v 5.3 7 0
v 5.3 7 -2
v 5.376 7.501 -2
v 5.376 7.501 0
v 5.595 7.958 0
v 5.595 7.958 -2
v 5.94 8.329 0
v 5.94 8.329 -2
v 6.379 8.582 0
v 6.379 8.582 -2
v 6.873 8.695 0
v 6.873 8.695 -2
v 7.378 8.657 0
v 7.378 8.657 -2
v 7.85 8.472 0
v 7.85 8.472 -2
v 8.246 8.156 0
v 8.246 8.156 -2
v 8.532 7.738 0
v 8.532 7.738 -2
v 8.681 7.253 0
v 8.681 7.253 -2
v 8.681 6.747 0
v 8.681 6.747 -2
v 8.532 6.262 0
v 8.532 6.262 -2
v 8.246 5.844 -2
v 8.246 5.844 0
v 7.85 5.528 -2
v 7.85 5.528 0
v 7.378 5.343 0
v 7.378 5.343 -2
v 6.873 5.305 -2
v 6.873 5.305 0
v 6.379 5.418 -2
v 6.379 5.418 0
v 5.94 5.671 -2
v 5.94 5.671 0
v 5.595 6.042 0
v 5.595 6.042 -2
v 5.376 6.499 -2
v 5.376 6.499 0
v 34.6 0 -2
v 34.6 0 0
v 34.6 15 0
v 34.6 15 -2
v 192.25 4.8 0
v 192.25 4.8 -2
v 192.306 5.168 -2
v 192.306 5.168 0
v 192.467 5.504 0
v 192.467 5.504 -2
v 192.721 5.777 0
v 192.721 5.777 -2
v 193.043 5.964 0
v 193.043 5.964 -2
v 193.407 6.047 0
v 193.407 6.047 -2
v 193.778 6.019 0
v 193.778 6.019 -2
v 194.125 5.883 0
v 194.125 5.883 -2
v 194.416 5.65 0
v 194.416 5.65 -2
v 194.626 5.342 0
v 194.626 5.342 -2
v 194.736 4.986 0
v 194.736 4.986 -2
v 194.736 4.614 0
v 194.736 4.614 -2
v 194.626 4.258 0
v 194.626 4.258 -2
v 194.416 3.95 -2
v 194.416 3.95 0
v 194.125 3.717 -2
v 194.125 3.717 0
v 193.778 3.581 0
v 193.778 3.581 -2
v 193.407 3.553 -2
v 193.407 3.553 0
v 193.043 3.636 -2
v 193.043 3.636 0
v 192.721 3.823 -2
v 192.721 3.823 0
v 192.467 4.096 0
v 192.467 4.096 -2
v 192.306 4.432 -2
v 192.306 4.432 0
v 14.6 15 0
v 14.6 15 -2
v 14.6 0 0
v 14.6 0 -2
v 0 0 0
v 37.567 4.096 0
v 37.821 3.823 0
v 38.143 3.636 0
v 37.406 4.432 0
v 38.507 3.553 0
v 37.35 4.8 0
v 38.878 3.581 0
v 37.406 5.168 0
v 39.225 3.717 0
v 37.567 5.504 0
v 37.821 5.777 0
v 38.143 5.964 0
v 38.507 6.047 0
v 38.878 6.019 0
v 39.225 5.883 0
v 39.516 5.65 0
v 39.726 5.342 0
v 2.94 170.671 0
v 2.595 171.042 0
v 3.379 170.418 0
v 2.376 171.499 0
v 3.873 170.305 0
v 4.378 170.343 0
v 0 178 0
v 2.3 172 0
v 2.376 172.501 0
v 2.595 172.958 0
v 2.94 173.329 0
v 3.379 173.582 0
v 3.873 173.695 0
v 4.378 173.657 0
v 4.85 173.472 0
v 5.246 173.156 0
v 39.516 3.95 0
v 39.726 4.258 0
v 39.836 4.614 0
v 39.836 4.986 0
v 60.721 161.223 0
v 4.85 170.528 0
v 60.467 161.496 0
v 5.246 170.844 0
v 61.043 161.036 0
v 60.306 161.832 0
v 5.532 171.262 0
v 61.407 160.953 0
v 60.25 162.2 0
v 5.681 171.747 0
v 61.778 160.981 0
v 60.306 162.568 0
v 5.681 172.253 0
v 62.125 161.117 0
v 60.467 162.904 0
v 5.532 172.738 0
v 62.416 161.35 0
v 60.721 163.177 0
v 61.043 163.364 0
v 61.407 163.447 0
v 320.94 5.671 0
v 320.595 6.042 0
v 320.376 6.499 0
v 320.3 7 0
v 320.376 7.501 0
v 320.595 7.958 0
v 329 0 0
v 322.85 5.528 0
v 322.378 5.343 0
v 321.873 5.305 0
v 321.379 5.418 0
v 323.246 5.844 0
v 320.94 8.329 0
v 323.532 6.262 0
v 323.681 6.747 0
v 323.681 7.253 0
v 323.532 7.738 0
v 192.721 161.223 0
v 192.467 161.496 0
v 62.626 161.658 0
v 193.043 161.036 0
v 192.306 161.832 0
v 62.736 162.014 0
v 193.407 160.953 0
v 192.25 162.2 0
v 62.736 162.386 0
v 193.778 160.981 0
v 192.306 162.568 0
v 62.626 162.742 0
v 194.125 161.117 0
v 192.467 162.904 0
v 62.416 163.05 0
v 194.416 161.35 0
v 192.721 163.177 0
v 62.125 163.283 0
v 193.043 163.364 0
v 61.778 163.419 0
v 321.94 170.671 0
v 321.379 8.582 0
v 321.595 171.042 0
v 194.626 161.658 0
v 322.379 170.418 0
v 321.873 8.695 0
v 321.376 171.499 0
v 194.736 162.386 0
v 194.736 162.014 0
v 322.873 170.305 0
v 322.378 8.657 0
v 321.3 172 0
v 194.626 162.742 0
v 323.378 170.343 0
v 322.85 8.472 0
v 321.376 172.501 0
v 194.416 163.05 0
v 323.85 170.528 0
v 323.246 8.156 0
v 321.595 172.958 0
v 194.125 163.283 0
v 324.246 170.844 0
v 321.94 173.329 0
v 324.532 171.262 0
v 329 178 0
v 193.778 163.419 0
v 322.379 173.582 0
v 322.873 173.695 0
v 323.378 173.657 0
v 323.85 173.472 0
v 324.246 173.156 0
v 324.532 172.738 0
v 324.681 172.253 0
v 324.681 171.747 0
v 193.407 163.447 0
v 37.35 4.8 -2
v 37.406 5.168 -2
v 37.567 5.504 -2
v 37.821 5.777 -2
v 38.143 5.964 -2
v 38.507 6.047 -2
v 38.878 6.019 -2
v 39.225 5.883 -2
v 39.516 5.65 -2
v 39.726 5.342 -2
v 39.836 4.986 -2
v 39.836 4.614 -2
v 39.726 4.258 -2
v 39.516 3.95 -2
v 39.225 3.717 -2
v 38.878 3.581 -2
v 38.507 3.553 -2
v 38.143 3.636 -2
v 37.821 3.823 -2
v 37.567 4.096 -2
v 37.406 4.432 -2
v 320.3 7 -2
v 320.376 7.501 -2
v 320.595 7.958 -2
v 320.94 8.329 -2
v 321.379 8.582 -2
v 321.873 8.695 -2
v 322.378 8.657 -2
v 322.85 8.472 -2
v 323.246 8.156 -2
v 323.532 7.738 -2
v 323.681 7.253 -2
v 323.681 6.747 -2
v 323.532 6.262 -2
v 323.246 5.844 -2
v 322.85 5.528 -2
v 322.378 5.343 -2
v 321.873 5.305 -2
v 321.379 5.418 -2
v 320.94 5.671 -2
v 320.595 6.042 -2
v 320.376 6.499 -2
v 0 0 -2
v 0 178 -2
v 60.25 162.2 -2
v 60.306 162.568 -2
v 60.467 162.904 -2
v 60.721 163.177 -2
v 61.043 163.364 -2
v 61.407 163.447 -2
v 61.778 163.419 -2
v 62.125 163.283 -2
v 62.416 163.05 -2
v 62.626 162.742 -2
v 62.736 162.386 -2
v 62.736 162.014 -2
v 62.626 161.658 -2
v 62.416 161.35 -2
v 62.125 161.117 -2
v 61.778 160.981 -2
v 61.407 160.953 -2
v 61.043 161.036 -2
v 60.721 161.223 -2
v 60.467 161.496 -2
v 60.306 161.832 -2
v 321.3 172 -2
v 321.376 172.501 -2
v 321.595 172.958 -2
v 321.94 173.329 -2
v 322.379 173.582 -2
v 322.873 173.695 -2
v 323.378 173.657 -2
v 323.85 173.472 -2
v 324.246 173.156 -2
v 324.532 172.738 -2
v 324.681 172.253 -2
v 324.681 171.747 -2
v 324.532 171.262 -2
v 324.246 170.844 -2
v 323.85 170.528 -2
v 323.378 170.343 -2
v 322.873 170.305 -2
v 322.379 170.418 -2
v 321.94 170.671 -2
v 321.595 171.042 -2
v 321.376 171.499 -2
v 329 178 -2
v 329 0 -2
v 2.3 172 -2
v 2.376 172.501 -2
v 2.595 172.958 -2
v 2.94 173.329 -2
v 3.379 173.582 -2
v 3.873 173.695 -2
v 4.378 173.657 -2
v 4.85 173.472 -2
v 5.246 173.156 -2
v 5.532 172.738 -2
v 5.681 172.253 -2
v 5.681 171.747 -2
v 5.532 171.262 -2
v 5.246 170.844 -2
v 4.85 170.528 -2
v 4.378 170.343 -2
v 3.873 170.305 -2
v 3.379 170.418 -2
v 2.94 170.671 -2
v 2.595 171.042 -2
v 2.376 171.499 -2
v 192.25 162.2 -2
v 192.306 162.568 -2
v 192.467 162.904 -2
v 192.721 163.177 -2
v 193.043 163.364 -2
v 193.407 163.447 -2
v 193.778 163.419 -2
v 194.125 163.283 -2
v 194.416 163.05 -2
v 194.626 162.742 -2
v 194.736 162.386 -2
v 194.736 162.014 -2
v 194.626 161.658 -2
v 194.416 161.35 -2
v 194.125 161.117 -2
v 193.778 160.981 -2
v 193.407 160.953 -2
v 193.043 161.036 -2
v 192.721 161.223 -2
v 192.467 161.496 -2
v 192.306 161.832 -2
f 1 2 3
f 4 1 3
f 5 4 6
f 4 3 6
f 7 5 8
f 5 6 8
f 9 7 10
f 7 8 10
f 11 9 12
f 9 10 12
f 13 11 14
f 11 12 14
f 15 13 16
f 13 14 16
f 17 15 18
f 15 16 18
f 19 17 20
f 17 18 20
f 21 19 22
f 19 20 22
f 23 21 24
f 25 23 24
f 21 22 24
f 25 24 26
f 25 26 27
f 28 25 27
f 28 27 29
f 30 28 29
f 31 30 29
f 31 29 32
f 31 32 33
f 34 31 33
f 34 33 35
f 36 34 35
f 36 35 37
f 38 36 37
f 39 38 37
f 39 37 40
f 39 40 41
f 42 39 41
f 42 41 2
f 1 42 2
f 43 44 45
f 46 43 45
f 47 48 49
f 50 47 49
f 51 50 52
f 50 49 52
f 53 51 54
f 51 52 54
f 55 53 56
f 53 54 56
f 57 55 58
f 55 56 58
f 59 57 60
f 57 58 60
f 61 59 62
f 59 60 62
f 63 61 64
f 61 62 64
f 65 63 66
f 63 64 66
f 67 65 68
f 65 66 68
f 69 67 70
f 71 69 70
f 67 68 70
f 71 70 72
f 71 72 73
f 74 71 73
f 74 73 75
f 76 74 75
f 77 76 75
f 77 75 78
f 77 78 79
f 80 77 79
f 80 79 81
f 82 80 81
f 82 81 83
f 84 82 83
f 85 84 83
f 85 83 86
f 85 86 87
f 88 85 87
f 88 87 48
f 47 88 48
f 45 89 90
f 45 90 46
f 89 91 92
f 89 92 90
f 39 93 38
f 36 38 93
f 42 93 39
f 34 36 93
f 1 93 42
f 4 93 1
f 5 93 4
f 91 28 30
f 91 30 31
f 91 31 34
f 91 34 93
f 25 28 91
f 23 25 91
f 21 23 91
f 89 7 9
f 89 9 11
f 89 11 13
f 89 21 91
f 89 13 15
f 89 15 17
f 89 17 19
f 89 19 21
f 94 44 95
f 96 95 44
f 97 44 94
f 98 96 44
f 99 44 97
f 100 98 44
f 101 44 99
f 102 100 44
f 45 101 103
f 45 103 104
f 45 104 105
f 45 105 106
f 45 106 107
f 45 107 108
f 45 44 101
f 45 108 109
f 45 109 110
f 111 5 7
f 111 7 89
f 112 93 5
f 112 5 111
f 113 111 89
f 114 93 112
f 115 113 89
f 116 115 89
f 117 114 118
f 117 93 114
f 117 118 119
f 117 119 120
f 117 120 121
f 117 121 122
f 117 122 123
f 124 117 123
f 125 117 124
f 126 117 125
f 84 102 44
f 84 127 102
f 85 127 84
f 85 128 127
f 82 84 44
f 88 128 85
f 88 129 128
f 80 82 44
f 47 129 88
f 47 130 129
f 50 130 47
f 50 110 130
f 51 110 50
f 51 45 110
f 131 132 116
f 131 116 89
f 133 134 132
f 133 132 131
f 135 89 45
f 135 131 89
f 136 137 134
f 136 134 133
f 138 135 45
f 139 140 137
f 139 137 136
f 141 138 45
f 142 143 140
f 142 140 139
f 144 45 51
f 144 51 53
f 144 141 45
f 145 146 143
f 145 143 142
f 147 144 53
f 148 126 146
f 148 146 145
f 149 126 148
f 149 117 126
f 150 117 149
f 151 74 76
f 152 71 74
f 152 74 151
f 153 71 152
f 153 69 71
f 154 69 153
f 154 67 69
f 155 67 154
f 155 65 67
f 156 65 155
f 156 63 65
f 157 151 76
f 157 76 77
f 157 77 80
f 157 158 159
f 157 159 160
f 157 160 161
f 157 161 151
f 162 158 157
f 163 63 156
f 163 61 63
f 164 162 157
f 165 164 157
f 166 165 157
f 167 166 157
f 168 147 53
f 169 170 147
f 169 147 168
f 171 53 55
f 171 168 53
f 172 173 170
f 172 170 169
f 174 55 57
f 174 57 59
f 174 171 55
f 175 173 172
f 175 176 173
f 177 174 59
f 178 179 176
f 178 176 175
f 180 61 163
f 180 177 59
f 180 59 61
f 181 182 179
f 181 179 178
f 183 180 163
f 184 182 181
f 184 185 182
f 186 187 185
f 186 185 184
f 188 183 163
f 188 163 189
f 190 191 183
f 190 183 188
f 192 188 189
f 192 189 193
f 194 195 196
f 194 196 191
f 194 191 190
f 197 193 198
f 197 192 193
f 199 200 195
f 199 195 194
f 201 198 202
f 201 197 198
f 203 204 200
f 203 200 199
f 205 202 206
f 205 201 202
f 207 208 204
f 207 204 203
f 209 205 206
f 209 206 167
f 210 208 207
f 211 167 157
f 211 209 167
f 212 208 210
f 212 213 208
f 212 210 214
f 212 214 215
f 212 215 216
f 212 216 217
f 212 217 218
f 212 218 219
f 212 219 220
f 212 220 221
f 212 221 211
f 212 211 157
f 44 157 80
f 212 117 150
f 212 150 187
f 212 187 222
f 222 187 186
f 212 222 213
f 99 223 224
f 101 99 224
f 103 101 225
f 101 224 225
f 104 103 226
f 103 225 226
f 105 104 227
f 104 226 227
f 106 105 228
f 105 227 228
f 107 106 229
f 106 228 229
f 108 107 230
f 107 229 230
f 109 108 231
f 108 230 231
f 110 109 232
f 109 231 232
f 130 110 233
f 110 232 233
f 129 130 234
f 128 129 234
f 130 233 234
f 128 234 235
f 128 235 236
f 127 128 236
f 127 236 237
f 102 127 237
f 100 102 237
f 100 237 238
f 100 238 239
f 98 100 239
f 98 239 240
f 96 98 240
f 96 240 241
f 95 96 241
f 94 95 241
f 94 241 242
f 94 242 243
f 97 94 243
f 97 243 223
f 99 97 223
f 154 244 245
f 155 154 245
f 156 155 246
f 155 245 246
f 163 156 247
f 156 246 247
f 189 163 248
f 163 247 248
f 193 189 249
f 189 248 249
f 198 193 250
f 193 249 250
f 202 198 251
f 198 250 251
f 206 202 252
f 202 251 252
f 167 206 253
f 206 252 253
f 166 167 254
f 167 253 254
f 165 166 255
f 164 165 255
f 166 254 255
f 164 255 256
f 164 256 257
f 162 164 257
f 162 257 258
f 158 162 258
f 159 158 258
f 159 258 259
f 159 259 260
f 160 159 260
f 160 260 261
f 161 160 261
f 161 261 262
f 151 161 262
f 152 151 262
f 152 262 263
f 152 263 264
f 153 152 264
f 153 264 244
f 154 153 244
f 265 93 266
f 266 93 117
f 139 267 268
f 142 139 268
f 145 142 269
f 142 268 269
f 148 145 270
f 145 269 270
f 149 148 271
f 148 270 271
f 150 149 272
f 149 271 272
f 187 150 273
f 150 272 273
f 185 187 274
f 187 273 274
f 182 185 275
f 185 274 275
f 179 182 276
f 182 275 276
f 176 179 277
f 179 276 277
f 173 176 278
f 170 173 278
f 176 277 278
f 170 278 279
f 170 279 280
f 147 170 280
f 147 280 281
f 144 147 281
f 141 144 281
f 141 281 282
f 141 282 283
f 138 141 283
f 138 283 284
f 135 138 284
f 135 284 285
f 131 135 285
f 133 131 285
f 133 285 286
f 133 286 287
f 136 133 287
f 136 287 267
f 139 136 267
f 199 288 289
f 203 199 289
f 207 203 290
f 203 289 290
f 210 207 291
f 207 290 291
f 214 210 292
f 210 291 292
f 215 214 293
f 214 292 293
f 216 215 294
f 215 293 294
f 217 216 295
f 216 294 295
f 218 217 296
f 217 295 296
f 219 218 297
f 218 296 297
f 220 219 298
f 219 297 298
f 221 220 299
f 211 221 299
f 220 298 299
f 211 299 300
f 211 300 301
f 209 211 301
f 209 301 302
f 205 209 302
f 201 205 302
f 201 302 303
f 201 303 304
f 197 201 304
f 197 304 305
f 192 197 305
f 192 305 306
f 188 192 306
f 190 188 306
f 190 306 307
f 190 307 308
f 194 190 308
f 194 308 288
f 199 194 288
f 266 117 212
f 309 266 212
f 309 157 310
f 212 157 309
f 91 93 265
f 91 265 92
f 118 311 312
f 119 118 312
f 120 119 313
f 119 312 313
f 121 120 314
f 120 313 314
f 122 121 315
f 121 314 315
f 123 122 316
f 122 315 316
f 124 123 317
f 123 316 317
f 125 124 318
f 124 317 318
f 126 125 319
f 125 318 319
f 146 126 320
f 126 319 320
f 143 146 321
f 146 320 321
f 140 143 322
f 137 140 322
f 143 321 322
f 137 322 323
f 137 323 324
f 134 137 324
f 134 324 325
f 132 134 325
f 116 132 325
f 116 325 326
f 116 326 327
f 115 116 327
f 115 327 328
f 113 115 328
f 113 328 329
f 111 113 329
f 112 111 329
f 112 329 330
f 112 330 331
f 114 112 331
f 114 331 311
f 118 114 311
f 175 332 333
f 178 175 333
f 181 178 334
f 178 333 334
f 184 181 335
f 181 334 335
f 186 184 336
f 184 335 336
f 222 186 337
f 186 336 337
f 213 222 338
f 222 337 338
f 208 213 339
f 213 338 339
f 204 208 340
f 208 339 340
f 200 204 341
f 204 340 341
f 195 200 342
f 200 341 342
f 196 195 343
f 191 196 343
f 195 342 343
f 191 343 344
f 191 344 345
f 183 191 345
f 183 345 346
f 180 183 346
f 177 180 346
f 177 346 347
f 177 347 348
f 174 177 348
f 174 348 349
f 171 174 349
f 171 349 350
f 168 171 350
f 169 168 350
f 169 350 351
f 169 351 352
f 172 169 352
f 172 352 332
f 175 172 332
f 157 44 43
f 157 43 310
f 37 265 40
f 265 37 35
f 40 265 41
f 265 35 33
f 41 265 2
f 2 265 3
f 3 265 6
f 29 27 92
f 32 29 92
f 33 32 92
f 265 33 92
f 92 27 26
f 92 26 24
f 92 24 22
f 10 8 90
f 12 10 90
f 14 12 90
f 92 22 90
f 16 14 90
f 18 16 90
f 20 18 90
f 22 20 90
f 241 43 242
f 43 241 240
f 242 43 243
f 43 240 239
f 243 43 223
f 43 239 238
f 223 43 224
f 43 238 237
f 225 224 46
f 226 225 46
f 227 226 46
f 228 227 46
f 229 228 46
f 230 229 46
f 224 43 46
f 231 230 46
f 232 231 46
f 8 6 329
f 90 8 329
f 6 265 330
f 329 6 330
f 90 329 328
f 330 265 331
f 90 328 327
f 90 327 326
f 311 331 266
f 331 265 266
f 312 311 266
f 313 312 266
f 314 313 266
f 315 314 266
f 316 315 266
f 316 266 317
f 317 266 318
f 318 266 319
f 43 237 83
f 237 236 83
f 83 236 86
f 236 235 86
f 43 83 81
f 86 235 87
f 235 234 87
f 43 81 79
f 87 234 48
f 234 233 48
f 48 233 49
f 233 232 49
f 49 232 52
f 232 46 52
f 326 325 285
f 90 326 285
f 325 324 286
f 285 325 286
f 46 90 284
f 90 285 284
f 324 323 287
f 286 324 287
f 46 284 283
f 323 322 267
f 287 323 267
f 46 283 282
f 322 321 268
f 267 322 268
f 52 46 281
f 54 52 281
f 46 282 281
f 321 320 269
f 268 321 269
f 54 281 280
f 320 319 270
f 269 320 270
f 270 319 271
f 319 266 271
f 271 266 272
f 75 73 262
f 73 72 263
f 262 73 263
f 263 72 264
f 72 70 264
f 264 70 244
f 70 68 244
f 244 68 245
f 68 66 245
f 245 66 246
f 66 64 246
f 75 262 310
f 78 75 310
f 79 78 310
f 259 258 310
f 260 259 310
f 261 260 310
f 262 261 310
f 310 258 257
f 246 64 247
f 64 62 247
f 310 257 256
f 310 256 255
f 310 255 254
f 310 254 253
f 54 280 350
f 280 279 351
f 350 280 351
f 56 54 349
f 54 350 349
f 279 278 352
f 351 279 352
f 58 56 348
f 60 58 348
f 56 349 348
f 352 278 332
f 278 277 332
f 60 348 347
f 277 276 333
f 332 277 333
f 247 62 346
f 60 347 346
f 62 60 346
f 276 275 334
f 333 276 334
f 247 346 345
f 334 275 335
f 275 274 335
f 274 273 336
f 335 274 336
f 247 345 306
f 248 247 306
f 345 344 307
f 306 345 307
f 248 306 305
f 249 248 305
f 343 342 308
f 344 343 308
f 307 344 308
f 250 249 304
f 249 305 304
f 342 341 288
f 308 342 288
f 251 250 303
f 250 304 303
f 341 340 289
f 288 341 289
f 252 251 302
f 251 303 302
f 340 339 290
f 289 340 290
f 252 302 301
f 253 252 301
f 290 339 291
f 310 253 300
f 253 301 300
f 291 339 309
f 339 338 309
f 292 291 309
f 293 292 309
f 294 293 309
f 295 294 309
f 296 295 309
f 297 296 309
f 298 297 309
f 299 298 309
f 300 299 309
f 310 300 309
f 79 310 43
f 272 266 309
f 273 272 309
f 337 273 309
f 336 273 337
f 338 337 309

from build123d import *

# Parameters (mm, degrees)
SKETCH_1_W             = 329
SKETCH_1_H             = 178
SM_BASE_FLANGE_1_DEPTH = 2
HOLE_WIZARD_M3_3_D     = 3.4
HOLE_WIZARD_M3_1_D     = 2.5
SKETCH_20_W            = 20
SKETCH_20_H            = 15
CUT_EXTRUDE_1_DEPTH    = 10


# Sheet-metal steps are written as plain solids
with BuildPart() as part:
    # Sketch 1 → ﾍﾞｰｽ-ﾌﾗﾝｼﾞ1 (new body)
    with BuildSketch(Plane.XY):
        with Locations((164.5, 89)):
            Rectangle(SKETCH_1_W, SKETCH_1_H)
    extrude(amount=-SM_BASE_FLANGE_1_DEPTH)

    # M3 すきま穴3 (through all)
    with Locations(Plane.XY):
        with Locations((322, 7), (7, 7), (4, 172), (323, 172)):
            Hole(HOLE_WIZARD_M3_3_D / 2)

    # M3 ねじ穴1 (through all)
    with Locations(Plane.XY):
        with Locations((61.5, 162.2), (193.5, 162.2), (193.5, 4.8), (38.6, 4.8)):
            Hole(HOLE_WIZARD_M3_1_D / 2)

    # ｽｹｯﾁ20 → ｶｯﾄ - 押し出し1 (cut)
    with BuildSketch(Plane.XY):
        with Locations((24.6, 7.5)):
            Rectangle(SKETCH_20_W, SKETCH_20_H)
    extrude(amount=-CUT_EXTRUDE_1_DEPTH, mode=Mode.SUBTRACT)


solid = part.part
